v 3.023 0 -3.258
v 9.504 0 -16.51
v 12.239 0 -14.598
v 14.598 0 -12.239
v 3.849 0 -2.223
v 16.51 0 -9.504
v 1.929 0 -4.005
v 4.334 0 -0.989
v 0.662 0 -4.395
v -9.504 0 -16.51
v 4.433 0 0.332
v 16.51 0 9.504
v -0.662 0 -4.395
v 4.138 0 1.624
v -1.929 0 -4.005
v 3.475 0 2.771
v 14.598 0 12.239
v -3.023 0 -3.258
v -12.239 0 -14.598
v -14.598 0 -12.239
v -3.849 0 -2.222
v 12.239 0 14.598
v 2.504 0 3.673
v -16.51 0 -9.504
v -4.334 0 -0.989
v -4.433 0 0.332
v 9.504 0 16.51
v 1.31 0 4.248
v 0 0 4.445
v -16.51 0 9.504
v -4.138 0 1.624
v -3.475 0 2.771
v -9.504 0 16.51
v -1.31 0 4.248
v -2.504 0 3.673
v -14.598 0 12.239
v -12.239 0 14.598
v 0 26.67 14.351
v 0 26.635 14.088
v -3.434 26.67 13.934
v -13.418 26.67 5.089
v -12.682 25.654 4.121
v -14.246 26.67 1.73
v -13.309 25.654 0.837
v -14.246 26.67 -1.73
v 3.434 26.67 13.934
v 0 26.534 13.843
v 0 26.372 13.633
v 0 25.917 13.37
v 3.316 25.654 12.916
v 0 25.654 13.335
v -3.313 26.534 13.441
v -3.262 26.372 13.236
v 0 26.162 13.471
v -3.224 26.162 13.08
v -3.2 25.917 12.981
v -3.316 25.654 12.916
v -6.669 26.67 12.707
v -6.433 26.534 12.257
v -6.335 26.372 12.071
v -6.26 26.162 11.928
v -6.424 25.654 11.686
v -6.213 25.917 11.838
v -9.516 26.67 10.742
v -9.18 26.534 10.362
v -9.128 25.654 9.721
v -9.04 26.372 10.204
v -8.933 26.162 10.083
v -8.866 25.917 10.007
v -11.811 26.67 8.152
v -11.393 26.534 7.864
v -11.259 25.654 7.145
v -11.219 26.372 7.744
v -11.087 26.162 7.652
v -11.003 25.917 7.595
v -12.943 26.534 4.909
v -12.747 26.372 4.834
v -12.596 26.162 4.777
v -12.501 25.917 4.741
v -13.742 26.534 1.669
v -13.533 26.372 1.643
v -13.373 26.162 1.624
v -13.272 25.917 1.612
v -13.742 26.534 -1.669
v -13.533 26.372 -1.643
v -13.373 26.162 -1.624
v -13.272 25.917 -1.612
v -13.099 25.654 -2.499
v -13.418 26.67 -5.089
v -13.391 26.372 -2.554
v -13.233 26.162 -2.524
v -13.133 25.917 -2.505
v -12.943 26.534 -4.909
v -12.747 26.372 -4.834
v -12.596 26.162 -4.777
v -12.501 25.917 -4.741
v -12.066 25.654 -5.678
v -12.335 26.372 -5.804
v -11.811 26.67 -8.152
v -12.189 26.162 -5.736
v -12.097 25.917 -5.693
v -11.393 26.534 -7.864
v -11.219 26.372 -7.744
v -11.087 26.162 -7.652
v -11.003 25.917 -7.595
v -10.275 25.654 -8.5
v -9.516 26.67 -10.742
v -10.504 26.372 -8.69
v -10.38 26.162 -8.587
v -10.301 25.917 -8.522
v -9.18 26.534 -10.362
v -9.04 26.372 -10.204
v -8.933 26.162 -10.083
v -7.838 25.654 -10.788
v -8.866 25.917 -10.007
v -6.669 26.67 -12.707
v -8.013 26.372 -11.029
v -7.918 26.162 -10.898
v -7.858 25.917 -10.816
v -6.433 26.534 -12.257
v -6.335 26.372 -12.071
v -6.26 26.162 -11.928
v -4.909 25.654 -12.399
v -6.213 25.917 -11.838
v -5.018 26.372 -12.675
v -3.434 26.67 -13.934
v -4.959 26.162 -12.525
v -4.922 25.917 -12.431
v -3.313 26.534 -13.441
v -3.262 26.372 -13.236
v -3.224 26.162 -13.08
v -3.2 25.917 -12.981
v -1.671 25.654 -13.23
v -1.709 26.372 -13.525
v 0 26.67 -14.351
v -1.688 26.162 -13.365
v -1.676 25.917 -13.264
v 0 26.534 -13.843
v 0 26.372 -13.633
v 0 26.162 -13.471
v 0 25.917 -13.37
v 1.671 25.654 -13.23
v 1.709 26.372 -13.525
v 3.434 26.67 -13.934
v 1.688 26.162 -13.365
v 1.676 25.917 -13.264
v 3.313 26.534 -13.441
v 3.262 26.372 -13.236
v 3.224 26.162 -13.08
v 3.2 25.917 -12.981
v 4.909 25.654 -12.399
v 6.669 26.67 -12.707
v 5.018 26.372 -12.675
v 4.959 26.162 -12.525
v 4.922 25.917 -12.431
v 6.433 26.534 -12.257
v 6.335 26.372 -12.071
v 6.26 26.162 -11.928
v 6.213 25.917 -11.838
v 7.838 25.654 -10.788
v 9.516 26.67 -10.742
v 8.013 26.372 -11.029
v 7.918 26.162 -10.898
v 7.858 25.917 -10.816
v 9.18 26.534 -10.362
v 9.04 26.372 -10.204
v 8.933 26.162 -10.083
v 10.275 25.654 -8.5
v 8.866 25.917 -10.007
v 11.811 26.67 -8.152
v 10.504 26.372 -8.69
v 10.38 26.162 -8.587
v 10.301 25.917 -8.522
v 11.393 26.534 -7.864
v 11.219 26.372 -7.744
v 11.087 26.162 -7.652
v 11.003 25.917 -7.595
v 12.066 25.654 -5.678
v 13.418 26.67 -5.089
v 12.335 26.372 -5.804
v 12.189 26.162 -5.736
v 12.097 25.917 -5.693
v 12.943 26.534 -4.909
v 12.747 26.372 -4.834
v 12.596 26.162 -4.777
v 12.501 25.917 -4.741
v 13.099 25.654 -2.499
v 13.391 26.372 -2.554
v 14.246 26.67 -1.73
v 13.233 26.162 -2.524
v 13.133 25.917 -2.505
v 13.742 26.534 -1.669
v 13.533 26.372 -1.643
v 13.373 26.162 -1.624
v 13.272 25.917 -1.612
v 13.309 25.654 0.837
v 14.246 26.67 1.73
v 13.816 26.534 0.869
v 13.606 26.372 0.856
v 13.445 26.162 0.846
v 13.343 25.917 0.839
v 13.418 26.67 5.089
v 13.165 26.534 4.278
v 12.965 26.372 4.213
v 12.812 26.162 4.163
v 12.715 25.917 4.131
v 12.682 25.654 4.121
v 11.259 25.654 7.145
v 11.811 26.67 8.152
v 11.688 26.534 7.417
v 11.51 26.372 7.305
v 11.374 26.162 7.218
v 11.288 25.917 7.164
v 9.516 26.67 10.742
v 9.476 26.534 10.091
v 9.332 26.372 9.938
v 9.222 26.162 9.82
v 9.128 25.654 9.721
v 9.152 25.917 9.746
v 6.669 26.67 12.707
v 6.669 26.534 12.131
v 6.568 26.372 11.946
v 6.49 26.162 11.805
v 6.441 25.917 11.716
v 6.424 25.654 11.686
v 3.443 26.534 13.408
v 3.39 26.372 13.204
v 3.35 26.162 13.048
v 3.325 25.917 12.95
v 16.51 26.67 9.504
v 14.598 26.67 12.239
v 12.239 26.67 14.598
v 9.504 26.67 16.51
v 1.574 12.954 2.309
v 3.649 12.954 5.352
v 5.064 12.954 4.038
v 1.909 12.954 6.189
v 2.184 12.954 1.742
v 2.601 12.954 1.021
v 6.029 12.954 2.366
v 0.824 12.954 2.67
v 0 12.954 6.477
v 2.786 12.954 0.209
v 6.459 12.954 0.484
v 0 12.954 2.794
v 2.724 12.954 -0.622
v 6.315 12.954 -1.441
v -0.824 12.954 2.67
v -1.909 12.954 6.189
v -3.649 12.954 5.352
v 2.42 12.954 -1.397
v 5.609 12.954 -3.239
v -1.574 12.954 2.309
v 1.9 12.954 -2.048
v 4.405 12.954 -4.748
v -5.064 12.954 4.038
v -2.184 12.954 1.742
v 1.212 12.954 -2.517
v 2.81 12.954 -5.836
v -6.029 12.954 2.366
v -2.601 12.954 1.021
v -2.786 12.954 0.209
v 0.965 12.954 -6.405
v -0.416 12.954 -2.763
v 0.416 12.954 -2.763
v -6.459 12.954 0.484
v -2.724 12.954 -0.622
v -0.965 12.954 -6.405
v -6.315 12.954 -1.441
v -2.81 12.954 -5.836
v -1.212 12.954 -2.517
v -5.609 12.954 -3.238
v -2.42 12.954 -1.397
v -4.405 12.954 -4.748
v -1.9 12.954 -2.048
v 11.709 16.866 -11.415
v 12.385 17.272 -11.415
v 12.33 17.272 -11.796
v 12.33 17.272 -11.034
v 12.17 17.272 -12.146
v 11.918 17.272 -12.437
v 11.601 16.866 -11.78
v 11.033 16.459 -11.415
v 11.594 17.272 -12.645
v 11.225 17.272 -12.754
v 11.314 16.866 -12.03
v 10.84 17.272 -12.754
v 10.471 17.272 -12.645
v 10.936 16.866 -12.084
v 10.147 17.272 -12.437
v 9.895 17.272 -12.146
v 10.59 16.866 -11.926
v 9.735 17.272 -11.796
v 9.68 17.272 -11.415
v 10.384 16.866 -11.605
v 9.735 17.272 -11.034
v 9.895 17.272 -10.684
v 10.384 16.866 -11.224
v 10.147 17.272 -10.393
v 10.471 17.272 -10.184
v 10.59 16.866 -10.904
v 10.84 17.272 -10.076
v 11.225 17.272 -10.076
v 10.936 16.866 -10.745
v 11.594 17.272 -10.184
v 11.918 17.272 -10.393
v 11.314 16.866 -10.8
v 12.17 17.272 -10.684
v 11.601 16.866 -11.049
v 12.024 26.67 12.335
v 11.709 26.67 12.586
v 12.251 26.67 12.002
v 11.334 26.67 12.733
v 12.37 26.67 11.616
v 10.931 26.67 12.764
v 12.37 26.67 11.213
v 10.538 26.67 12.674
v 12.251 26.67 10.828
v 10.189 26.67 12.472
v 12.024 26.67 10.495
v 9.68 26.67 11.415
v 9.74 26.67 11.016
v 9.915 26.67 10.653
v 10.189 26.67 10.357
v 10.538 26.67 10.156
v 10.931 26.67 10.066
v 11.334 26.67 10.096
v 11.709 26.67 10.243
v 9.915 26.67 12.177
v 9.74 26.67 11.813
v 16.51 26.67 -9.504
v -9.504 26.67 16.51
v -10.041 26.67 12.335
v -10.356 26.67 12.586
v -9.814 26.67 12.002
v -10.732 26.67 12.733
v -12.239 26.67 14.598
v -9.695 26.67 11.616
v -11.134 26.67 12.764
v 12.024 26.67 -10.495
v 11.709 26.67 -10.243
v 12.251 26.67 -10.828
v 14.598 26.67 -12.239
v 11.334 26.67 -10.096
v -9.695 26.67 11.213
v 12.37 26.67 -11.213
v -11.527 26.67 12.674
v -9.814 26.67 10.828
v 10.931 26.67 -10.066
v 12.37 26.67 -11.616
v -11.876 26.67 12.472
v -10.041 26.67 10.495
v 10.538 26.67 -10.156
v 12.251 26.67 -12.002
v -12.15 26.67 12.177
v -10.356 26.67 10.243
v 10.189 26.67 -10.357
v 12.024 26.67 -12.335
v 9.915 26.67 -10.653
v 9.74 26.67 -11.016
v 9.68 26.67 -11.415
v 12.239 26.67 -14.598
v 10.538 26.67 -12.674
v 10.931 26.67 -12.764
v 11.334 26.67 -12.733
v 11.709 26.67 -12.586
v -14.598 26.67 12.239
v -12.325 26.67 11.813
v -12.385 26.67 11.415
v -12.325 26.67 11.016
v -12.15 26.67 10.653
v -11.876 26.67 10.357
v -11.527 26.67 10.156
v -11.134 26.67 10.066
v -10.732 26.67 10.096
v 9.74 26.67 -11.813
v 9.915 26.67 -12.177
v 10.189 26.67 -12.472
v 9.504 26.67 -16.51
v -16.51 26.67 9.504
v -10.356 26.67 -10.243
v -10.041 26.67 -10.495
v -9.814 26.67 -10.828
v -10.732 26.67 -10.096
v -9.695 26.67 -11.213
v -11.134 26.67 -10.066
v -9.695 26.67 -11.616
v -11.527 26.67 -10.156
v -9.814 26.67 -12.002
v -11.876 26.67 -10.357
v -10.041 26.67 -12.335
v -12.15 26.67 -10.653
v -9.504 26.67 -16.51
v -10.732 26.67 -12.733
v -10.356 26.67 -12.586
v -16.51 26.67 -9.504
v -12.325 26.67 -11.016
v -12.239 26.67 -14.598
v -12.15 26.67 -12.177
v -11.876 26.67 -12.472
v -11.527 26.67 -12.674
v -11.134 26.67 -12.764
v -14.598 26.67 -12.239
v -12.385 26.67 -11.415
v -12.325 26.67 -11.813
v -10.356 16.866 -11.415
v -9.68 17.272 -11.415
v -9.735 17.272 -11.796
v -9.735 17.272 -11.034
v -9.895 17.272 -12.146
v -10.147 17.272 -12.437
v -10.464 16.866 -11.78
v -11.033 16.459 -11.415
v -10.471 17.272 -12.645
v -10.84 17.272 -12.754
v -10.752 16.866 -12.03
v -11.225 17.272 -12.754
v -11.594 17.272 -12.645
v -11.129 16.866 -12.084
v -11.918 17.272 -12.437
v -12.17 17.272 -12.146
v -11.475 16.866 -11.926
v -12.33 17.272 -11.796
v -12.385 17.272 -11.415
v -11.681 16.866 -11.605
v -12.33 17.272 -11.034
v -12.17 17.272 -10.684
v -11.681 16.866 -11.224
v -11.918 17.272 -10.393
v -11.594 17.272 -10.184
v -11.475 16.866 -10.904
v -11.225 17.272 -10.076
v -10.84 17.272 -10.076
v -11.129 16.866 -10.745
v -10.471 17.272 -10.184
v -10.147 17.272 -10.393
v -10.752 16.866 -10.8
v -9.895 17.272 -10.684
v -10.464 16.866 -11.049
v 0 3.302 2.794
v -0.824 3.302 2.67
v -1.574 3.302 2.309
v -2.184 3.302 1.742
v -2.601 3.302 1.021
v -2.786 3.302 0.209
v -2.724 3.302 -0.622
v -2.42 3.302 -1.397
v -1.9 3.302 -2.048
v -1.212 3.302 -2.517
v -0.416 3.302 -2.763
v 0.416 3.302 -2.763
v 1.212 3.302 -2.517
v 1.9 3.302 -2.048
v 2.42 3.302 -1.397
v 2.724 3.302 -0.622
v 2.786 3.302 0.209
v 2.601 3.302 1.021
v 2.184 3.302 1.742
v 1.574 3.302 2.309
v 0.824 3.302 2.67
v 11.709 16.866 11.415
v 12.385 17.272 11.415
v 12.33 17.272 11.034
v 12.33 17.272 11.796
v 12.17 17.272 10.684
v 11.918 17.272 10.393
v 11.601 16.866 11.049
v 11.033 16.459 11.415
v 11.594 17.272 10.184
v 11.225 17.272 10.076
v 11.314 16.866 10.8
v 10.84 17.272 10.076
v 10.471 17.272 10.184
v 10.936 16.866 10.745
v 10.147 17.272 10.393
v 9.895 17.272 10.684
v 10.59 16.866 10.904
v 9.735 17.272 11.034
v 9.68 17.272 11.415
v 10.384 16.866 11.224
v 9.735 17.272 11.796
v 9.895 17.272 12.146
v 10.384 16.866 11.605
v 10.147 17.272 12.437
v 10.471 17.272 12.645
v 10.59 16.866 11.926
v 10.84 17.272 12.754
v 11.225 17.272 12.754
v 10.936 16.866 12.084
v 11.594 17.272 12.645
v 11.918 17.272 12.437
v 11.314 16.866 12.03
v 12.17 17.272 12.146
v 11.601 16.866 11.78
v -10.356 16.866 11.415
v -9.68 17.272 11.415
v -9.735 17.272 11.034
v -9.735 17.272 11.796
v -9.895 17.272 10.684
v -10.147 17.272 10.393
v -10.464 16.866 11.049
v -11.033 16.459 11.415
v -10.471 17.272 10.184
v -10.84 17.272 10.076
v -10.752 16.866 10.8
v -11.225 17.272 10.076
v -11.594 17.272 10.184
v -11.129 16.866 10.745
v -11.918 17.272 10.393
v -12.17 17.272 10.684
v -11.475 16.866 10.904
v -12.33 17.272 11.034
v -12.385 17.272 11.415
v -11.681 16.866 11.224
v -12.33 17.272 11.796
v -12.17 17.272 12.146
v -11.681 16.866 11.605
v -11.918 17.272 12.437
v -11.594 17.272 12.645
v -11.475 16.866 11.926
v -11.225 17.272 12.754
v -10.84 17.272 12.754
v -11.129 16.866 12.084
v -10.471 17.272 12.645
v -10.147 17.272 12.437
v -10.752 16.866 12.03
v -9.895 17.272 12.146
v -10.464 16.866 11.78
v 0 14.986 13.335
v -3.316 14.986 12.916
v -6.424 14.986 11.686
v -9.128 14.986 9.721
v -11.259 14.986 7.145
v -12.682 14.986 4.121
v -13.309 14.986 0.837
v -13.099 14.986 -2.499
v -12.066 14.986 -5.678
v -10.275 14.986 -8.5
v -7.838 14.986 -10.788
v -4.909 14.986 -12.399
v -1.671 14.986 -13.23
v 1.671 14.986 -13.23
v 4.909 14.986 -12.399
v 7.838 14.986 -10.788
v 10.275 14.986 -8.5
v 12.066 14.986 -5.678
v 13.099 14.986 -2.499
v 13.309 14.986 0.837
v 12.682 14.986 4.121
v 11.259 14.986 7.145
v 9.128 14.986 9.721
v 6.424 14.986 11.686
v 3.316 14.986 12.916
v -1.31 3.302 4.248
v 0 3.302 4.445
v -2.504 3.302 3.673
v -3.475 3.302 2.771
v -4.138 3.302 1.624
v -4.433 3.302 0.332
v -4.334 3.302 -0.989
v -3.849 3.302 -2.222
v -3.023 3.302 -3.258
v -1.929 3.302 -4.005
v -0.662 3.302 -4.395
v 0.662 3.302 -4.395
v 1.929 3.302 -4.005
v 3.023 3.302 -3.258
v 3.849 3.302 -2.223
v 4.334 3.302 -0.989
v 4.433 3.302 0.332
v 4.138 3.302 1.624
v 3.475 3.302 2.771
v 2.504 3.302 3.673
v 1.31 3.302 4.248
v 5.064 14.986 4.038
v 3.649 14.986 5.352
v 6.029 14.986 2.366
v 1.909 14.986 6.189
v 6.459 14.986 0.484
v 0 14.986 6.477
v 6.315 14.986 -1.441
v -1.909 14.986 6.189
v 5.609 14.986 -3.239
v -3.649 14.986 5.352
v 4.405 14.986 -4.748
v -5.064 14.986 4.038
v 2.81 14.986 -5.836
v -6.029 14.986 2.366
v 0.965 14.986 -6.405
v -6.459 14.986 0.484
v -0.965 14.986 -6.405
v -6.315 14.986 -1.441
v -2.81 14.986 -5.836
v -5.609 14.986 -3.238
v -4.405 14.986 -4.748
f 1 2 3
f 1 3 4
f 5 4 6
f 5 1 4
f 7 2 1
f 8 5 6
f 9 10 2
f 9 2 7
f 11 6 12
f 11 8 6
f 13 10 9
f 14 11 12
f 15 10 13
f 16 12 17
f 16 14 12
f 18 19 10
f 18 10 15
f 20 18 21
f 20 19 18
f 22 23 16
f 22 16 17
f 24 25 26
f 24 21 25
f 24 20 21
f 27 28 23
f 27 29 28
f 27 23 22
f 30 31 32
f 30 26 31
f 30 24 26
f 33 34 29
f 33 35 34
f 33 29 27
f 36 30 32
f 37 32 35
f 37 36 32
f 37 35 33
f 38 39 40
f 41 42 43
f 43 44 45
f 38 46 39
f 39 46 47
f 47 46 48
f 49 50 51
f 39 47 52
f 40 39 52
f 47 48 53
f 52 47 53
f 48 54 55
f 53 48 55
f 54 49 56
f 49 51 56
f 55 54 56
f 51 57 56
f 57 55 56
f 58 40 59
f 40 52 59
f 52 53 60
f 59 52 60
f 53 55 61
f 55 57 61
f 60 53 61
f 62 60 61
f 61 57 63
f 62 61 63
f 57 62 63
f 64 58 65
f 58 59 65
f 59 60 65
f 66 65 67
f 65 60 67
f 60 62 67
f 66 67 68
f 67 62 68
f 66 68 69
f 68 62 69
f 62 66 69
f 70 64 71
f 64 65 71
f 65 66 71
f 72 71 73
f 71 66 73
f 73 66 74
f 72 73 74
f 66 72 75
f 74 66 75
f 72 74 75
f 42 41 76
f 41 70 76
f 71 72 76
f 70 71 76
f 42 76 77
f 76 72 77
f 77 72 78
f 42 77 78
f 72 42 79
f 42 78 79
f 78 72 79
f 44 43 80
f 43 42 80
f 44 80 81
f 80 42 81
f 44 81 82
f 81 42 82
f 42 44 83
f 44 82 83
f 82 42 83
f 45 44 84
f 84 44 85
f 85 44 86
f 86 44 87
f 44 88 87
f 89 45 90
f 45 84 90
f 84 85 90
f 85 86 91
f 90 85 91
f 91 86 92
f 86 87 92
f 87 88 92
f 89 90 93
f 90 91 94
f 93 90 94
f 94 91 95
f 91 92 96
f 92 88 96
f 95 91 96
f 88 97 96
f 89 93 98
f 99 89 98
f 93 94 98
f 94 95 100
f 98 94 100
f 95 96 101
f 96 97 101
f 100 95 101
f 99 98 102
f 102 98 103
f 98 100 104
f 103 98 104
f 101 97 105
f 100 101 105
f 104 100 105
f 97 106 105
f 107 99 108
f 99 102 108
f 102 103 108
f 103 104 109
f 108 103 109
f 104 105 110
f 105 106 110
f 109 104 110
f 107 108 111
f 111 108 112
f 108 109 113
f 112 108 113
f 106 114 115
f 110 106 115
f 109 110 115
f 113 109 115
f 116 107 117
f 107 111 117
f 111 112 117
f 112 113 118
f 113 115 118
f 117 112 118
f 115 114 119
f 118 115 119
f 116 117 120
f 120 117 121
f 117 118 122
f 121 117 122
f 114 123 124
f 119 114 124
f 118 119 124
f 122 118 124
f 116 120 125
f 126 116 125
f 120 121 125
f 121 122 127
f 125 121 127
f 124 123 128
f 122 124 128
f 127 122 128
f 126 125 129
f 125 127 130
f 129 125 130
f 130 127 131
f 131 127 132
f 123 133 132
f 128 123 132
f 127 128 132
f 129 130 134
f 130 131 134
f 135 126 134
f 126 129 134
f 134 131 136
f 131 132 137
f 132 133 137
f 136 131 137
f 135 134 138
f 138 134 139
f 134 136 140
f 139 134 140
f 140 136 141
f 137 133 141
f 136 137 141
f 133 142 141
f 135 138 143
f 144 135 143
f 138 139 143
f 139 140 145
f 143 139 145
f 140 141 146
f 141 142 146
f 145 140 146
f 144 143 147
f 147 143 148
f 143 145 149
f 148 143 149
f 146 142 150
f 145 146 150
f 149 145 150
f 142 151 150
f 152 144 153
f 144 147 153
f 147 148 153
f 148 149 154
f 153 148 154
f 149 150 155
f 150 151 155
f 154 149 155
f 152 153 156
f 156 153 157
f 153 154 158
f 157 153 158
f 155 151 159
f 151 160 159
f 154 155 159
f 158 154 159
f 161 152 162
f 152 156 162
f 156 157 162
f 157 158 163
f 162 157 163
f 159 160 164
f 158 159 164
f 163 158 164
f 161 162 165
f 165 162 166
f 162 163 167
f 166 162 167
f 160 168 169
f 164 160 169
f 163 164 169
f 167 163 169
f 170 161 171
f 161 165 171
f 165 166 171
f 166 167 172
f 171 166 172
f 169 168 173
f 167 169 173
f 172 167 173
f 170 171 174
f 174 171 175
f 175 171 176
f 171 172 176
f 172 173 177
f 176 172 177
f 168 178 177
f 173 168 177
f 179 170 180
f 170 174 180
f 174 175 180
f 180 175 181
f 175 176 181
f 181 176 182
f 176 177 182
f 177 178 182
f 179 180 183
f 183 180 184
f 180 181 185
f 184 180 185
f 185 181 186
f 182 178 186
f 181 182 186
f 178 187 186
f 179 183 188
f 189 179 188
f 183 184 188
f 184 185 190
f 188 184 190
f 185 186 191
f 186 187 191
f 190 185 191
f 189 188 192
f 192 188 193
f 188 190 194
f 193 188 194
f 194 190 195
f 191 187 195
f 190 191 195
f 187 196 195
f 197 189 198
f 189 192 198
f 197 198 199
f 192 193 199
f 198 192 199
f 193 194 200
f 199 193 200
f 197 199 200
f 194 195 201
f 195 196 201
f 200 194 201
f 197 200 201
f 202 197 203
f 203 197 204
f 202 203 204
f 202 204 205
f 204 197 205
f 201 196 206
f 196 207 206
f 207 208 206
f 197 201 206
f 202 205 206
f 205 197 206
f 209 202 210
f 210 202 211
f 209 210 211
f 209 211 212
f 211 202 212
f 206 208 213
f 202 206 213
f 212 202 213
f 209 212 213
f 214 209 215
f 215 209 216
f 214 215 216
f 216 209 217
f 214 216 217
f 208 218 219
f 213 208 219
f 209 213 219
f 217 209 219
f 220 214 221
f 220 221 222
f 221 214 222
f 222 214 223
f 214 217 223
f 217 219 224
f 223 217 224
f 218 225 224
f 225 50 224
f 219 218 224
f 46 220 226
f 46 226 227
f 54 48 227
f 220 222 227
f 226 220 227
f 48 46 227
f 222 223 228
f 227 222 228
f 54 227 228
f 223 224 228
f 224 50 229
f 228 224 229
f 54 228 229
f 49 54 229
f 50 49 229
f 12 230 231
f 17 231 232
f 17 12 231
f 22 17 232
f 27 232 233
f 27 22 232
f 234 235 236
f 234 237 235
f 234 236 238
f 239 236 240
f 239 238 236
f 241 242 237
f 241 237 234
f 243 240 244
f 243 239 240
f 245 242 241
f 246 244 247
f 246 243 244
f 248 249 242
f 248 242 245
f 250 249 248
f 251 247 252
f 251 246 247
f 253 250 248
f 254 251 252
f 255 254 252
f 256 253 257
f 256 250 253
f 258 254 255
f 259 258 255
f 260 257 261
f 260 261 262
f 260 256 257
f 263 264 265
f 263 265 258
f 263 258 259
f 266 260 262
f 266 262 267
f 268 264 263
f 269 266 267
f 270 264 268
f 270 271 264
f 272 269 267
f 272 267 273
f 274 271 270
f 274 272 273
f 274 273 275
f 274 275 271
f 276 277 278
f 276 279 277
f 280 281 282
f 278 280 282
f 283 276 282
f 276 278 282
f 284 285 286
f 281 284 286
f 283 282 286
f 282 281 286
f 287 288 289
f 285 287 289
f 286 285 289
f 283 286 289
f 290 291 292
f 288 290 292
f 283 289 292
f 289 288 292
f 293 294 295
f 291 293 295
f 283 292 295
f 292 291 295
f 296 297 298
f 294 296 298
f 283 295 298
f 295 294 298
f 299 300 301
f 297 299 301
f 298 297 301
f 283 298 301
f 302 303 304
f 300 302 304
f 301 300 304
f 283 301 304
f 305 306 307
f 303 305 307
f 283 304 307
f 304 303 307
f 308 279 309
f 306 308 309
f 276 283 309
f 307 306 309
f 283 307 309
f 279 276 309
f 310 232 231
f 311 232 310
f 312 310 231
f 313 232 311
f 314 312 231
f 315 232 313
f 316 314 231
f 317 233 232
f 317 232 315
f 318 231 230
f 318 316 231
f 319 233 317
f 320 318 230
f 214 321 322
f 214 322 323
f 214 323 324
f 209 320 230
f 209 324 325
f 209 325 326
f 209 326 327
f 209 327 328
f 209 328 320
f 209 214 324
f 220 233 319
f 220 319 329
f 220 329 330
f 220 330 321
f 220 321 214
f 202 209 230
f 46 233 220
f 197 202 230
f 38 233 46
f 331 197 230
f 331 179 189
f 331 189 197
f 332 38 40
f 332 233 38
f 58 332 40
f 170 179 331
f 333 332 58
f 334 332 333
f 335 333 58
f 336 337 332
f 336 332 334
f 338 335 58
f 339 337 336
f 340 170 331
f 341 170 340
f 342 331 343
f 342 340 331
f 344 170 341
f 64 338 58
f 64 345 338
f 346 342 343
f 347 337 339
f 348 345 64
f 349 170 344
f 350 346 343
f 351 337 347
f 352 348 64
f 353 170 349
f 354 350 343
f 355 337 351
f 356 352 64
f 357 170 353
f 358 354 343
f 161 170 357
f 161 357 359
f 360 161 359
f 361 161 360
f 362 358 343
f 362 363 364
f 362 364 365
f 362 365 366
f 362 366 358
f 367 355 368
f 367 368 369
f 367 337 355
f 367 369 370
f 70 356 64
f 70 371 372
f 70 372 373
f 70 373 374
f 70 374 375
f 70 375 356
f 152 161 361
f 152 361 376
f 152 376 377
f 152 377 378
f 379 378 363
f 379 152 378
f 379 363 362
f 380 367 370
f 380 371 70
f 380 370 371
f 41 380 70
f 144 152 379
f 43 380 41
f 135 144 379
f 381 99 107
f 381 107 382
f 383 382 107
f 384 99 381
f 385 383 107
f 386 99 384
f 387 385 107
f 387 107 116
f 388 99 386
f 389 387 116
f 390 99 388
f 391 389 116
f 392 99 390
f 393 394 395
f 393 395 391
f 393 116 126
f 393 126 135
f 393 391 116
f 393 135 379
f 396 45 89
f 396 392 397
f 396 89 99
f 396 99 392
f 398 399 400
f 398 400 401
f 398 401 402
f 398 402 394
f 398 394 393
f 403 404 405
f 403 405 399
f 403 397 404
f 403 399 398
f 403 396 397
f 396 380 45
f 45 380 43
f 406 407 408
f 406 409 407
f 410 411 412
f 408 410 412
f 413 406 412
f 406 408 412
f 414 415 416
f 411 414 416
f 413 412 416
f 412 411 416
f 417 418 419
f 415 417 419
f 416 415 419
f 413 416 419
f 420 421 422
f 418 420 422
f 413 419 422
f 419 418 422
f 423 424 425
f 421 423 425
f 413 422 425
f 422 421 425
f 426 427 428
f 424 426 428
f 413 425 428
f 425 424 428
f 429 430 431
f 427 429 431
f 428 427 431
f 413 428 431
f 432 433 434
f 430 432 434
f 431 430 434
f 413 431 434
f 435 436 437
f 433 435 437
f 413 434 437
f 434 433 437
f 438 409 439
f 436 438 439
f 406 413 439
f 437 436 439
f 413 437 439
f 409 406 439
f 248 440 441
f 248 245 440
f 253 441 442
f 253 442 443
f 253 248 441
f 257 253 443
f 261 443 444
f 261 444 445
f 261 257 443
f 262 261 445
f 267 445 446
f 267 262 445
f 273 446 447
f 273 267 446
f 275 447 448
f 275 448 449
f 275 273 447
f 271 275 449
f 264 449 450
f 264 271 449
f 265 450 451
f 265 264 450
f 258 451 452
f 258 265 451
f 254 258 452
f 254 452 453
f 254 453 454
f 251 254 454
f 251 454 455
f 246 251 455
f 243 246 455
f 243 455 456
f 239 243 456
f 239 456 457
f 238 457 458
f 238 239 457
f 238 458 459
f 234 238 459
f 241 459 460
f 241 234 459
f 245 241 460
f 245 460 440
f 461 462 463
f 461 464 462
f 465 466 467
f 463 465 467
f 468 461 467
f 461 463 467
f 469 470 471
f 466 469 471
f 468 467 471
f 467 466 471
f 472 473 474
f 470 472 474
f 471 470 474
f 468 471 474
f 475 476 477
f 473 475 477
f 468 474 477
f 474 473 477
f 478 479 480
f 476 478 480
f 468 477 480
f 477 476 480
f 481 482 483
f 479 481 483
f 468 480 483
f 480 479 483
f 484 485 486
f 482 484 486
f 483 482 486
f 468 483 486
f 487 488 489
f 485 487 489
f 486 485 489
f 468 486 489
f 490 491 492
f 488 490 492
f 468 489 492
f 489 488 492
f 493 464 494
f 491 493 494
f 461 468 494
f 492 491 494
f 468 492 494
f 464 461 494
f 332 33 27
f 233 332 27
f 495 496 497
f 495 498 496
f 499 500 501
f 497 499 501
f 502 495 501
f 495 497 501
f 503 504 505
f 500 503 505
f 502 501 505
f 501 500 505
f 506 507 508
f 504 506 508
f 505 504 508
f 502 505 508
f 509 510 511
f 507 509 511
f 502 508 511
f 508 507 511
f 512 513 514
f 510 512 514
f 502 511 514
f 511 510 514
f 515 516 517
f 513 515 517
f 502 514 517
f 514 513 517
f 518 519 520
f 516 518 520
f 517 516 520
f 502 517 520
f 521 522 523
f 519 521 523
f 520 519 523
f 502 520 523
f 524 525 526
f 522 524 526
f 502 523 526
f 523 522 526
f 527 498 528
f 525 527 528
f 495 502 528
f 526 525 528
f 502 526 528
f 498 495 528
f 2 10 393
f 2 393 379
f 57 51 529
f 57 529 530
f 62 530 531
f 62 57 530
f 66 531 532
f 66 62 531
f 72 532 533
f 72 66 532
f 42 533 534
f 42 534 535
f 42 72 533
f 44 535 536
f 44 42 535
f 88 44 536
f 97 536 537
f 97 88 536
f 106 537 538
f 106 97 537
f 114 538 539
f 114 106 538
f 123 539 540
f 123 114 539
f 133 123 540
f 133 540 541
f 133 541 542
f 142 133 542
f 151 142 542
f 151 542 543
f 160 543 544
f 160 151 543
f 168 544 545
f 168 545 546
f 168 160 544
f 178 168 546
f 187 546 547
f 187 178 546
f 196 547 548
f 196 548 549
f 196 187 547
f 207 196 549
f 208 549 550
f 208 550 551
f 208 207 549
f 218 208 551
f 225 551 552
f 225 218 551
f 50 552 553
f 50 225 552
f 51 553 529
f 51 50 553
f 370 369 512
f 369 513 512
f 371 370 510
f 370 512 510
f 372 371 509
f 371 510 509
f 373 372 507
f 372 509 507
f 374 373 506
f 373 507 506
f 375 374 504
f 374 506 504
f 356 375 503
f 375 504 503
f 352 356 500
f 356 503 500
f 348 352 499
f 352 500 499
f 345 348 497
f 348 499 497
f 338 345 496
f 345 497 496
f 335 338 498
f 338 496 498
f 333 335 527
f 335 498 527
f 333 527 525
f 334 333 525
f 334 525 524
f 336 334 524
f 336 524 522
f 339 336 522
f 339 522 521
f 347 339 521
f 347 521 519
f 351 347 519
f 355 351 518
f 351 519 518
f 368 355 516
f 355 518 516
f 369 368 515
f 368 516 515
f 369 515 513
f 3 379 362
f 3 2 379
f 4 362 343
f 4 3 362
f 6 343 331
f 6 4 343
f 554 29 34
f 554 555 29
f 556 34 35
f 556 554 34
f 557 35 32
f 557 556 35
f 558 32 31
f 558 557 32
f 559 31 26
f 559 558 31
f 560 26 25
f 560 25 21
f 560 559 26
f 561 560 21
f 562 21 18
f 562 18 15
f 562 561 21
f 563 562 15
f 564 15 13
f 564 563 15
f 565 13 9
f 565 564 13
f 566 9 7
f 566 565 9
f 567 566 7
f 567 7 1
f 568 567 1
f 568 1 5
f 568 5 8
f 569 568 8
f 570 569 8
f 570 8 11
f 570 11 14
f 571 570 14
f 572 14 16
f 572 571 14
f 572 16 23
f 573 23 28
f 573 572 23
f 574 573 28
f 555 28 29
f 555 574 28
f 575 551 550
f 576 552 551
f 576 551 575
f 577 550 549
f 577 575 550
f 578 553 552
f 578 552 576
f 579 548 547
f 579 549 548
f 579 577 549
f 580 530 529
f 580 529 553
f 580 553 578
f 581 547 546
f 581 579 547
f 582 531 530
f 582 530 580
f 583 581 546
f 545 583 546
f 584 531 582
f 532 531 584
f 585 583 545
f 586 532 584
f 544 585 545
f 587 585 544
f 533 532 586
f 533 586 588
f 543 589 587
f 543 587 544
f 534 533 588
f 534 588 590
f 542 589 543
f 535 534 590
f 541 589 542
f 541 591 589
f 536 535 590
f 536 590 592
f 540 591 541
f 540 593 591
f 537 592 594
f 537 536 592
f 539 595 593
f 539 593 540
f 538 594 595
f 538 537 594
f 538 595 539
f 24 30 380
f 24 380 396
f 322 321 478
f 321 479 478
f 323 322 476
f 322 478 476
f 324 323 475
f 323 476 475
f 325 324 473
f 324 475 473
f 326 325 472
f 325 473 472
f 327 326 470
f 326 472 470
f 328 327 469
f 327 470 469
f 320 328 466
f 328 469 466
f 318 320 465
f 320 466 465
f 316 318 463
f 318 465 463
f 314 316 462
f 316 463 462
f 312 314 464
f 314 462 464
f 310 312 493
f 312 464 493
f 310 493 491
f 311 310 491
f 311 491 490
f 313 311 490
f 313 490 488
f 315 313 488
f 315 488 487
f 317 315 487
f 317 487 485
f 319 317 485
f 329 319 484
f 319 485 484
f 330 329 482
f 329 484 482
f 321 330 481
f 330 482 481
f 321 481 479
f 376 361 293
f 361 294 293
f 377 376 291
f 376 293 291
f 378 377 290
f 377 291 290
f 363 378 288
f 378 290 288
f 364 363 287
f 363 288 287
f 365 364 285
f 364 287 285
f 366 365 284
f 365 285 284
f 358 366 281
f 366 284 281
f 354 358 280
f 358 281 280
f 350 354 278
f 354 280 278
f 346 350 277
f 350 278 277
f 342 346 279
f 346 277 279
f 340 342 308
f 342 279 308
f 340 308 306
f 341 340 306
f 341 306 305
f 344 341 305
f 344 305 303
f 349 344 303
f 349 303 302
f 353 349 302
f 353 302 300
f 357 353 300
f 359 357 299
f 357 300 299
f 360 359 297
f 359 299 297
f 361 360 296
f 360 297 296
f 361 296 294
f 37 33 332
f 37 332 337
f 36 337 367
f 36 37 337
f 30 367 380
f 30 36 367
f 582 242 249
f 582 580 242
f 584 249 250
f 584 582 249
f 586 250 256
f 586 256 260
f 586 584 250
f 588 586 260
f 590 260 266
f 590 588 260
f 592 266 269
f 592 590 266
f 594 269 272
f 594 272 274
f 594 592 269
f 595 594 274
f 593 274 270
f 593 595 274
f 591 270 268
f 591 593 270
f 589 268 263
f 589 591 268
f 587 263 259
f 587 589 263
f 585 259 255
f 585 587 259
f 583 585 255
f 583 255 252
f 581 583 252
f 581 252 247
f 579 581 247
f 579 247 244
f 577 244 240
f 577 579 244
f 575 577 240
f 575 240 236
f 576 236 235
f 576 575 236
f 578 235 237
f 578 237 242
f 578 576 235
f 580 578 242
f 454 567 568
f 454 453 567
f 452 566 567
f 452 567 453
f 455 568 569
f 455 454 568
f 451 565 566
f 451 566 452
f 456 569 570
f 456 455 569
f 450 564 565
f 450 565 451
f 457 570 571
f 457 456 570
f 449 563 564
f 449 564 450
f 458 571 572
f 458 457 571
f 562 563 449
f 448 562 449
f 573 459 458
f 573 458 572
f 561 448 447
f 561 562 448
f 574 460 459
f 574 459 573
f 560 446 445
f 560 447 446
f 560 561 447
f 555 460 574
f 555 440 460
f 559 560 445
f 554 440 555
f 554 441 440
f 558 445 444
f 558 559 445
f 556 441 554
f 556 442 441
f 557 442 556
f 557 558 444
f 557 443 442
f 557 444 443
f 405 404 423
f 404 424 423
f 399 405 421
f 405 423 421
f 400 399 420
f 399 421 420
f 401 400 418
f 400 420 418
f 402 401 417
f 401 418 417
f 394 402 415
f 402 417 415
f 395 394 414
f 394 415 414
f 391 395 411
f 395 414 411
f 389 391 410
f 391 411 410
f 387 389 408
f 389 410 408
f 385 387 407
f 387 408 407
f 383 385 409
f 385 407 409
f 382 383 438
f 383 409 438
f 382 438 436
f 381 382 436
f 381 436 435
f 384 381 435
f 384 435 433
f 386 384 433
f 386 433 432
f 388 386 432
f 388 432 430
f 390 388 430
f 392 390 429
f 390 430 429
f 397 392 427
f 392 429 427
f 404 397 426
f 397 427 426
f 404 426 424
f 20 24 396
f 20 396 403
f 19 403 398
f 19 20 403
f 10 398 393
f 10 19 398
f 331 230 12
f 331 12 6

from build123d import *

# Parameters (mm, degrees)
CUT_EXTRUDE2_DEPTH        = 38.909021354
CUT_EXTRUDE2_DEPTH_BACK   = 38.909021354
SKETCH4_OUTSIDE_W         = 52.124
SKETCH4_OUTSIDE_H         = 52.124
SKETCH4_OUTSIDE_W_2       = 33.02
SKETCH4_OUTSIDE_H_2       = 33.02
F_6_32_TAPPED_HOLE2_D     = 2.7051
F_6_32_TAPPED_HOLE2_DEPTH = 9.398
F_6_32_TAPPED_HOLE2_TIP   = 0.81269403
FILLET1_R                 = 1.016


with BuildPart() as part:
    # Vent Valve Body Profile → Revolve2 (revolve)
    with BuildSketch(Plane.XY, mode=Mode.PRIVATE) as revolve2_sk:
        Polygon((-19.05, 26.67), (-19.05, 0), (-4.445, 0), (-4.445, 3.302), (-2.794, 3.302), (-2.794, 12.954), (-6.477, 12.954), (-6.477, 14.986), (-13.335, 14.986), (-13.335, 26.67), align=None)
    revolve(revolve2_sk.sketch.rotate(Axis((0, 11.135829036, 0), (0, -1, 0)), 270), axis=Axis((0, 11.135829036, 0), (0, -1, 0)))

    # Sketch4 outside → Cut-Extrude2 (cut, two sides: drawn at the far end of the back side and taken through both)
    with BuildSketch(Plane(origin=(0, 26.67, 0), x_dir=(1, 0, 0), z_dir=(0, 1, 0)).offset(-CUT_EXTRUDE2_DEPTH_BACK)):
        Rectangle(SKETCH4_OUTSIDE_W, SKETCH4_OUTSIDE_H)
        Rectangle(SKETCH4_OUTSIDE_W_2, SKETCH4_OUTSIDE_H_2, mode=Mode.SUBTRACT)
    extrude(amount=CUT_EXTRUDE2_DEPTH + CUT_EXTRUDE2_DEPTH_BACK, mode=Mode.SUBTRACT)

    # #6-32 Tapped Hole2
    with Locations(Plane(origin=(0, 26.67, 0), x_dir=(1, 0, 0), z_dir=(0, 1, 0))):
        with Locations((11.032567234, 11.414818668), (11.032567234, -11.414818668), (-11.032567234, -11.414818668), (-11.032567234, 11.414818668)):
            Hole(F_6_32_TAPPED_HOLE2_D / 2, depth=F_6_32_TAPPED_HOLE2_DEPTH)
            with Locations((0, 0, -(F_6_32_TAPPED_HOLE2_DEPTH + F_6_32_TAPPED_HOLE2_TIP / 2))):  # 118° drill point
                Cone(0, F_6_32_TAPPED_HOLE2_D / 2, F_6_32_TAPPED_HOLE2_TIP, mode=Mode.SUBTRACT)

    # Fillet1
    fillet1_edges = [part.edges().sort_by_distance(p)[0] for p in [
        (0, 26.67, -13.335),
    ]]
    fillet(fillet1_edges, radius=FILLET1_R)


solid = part.part
